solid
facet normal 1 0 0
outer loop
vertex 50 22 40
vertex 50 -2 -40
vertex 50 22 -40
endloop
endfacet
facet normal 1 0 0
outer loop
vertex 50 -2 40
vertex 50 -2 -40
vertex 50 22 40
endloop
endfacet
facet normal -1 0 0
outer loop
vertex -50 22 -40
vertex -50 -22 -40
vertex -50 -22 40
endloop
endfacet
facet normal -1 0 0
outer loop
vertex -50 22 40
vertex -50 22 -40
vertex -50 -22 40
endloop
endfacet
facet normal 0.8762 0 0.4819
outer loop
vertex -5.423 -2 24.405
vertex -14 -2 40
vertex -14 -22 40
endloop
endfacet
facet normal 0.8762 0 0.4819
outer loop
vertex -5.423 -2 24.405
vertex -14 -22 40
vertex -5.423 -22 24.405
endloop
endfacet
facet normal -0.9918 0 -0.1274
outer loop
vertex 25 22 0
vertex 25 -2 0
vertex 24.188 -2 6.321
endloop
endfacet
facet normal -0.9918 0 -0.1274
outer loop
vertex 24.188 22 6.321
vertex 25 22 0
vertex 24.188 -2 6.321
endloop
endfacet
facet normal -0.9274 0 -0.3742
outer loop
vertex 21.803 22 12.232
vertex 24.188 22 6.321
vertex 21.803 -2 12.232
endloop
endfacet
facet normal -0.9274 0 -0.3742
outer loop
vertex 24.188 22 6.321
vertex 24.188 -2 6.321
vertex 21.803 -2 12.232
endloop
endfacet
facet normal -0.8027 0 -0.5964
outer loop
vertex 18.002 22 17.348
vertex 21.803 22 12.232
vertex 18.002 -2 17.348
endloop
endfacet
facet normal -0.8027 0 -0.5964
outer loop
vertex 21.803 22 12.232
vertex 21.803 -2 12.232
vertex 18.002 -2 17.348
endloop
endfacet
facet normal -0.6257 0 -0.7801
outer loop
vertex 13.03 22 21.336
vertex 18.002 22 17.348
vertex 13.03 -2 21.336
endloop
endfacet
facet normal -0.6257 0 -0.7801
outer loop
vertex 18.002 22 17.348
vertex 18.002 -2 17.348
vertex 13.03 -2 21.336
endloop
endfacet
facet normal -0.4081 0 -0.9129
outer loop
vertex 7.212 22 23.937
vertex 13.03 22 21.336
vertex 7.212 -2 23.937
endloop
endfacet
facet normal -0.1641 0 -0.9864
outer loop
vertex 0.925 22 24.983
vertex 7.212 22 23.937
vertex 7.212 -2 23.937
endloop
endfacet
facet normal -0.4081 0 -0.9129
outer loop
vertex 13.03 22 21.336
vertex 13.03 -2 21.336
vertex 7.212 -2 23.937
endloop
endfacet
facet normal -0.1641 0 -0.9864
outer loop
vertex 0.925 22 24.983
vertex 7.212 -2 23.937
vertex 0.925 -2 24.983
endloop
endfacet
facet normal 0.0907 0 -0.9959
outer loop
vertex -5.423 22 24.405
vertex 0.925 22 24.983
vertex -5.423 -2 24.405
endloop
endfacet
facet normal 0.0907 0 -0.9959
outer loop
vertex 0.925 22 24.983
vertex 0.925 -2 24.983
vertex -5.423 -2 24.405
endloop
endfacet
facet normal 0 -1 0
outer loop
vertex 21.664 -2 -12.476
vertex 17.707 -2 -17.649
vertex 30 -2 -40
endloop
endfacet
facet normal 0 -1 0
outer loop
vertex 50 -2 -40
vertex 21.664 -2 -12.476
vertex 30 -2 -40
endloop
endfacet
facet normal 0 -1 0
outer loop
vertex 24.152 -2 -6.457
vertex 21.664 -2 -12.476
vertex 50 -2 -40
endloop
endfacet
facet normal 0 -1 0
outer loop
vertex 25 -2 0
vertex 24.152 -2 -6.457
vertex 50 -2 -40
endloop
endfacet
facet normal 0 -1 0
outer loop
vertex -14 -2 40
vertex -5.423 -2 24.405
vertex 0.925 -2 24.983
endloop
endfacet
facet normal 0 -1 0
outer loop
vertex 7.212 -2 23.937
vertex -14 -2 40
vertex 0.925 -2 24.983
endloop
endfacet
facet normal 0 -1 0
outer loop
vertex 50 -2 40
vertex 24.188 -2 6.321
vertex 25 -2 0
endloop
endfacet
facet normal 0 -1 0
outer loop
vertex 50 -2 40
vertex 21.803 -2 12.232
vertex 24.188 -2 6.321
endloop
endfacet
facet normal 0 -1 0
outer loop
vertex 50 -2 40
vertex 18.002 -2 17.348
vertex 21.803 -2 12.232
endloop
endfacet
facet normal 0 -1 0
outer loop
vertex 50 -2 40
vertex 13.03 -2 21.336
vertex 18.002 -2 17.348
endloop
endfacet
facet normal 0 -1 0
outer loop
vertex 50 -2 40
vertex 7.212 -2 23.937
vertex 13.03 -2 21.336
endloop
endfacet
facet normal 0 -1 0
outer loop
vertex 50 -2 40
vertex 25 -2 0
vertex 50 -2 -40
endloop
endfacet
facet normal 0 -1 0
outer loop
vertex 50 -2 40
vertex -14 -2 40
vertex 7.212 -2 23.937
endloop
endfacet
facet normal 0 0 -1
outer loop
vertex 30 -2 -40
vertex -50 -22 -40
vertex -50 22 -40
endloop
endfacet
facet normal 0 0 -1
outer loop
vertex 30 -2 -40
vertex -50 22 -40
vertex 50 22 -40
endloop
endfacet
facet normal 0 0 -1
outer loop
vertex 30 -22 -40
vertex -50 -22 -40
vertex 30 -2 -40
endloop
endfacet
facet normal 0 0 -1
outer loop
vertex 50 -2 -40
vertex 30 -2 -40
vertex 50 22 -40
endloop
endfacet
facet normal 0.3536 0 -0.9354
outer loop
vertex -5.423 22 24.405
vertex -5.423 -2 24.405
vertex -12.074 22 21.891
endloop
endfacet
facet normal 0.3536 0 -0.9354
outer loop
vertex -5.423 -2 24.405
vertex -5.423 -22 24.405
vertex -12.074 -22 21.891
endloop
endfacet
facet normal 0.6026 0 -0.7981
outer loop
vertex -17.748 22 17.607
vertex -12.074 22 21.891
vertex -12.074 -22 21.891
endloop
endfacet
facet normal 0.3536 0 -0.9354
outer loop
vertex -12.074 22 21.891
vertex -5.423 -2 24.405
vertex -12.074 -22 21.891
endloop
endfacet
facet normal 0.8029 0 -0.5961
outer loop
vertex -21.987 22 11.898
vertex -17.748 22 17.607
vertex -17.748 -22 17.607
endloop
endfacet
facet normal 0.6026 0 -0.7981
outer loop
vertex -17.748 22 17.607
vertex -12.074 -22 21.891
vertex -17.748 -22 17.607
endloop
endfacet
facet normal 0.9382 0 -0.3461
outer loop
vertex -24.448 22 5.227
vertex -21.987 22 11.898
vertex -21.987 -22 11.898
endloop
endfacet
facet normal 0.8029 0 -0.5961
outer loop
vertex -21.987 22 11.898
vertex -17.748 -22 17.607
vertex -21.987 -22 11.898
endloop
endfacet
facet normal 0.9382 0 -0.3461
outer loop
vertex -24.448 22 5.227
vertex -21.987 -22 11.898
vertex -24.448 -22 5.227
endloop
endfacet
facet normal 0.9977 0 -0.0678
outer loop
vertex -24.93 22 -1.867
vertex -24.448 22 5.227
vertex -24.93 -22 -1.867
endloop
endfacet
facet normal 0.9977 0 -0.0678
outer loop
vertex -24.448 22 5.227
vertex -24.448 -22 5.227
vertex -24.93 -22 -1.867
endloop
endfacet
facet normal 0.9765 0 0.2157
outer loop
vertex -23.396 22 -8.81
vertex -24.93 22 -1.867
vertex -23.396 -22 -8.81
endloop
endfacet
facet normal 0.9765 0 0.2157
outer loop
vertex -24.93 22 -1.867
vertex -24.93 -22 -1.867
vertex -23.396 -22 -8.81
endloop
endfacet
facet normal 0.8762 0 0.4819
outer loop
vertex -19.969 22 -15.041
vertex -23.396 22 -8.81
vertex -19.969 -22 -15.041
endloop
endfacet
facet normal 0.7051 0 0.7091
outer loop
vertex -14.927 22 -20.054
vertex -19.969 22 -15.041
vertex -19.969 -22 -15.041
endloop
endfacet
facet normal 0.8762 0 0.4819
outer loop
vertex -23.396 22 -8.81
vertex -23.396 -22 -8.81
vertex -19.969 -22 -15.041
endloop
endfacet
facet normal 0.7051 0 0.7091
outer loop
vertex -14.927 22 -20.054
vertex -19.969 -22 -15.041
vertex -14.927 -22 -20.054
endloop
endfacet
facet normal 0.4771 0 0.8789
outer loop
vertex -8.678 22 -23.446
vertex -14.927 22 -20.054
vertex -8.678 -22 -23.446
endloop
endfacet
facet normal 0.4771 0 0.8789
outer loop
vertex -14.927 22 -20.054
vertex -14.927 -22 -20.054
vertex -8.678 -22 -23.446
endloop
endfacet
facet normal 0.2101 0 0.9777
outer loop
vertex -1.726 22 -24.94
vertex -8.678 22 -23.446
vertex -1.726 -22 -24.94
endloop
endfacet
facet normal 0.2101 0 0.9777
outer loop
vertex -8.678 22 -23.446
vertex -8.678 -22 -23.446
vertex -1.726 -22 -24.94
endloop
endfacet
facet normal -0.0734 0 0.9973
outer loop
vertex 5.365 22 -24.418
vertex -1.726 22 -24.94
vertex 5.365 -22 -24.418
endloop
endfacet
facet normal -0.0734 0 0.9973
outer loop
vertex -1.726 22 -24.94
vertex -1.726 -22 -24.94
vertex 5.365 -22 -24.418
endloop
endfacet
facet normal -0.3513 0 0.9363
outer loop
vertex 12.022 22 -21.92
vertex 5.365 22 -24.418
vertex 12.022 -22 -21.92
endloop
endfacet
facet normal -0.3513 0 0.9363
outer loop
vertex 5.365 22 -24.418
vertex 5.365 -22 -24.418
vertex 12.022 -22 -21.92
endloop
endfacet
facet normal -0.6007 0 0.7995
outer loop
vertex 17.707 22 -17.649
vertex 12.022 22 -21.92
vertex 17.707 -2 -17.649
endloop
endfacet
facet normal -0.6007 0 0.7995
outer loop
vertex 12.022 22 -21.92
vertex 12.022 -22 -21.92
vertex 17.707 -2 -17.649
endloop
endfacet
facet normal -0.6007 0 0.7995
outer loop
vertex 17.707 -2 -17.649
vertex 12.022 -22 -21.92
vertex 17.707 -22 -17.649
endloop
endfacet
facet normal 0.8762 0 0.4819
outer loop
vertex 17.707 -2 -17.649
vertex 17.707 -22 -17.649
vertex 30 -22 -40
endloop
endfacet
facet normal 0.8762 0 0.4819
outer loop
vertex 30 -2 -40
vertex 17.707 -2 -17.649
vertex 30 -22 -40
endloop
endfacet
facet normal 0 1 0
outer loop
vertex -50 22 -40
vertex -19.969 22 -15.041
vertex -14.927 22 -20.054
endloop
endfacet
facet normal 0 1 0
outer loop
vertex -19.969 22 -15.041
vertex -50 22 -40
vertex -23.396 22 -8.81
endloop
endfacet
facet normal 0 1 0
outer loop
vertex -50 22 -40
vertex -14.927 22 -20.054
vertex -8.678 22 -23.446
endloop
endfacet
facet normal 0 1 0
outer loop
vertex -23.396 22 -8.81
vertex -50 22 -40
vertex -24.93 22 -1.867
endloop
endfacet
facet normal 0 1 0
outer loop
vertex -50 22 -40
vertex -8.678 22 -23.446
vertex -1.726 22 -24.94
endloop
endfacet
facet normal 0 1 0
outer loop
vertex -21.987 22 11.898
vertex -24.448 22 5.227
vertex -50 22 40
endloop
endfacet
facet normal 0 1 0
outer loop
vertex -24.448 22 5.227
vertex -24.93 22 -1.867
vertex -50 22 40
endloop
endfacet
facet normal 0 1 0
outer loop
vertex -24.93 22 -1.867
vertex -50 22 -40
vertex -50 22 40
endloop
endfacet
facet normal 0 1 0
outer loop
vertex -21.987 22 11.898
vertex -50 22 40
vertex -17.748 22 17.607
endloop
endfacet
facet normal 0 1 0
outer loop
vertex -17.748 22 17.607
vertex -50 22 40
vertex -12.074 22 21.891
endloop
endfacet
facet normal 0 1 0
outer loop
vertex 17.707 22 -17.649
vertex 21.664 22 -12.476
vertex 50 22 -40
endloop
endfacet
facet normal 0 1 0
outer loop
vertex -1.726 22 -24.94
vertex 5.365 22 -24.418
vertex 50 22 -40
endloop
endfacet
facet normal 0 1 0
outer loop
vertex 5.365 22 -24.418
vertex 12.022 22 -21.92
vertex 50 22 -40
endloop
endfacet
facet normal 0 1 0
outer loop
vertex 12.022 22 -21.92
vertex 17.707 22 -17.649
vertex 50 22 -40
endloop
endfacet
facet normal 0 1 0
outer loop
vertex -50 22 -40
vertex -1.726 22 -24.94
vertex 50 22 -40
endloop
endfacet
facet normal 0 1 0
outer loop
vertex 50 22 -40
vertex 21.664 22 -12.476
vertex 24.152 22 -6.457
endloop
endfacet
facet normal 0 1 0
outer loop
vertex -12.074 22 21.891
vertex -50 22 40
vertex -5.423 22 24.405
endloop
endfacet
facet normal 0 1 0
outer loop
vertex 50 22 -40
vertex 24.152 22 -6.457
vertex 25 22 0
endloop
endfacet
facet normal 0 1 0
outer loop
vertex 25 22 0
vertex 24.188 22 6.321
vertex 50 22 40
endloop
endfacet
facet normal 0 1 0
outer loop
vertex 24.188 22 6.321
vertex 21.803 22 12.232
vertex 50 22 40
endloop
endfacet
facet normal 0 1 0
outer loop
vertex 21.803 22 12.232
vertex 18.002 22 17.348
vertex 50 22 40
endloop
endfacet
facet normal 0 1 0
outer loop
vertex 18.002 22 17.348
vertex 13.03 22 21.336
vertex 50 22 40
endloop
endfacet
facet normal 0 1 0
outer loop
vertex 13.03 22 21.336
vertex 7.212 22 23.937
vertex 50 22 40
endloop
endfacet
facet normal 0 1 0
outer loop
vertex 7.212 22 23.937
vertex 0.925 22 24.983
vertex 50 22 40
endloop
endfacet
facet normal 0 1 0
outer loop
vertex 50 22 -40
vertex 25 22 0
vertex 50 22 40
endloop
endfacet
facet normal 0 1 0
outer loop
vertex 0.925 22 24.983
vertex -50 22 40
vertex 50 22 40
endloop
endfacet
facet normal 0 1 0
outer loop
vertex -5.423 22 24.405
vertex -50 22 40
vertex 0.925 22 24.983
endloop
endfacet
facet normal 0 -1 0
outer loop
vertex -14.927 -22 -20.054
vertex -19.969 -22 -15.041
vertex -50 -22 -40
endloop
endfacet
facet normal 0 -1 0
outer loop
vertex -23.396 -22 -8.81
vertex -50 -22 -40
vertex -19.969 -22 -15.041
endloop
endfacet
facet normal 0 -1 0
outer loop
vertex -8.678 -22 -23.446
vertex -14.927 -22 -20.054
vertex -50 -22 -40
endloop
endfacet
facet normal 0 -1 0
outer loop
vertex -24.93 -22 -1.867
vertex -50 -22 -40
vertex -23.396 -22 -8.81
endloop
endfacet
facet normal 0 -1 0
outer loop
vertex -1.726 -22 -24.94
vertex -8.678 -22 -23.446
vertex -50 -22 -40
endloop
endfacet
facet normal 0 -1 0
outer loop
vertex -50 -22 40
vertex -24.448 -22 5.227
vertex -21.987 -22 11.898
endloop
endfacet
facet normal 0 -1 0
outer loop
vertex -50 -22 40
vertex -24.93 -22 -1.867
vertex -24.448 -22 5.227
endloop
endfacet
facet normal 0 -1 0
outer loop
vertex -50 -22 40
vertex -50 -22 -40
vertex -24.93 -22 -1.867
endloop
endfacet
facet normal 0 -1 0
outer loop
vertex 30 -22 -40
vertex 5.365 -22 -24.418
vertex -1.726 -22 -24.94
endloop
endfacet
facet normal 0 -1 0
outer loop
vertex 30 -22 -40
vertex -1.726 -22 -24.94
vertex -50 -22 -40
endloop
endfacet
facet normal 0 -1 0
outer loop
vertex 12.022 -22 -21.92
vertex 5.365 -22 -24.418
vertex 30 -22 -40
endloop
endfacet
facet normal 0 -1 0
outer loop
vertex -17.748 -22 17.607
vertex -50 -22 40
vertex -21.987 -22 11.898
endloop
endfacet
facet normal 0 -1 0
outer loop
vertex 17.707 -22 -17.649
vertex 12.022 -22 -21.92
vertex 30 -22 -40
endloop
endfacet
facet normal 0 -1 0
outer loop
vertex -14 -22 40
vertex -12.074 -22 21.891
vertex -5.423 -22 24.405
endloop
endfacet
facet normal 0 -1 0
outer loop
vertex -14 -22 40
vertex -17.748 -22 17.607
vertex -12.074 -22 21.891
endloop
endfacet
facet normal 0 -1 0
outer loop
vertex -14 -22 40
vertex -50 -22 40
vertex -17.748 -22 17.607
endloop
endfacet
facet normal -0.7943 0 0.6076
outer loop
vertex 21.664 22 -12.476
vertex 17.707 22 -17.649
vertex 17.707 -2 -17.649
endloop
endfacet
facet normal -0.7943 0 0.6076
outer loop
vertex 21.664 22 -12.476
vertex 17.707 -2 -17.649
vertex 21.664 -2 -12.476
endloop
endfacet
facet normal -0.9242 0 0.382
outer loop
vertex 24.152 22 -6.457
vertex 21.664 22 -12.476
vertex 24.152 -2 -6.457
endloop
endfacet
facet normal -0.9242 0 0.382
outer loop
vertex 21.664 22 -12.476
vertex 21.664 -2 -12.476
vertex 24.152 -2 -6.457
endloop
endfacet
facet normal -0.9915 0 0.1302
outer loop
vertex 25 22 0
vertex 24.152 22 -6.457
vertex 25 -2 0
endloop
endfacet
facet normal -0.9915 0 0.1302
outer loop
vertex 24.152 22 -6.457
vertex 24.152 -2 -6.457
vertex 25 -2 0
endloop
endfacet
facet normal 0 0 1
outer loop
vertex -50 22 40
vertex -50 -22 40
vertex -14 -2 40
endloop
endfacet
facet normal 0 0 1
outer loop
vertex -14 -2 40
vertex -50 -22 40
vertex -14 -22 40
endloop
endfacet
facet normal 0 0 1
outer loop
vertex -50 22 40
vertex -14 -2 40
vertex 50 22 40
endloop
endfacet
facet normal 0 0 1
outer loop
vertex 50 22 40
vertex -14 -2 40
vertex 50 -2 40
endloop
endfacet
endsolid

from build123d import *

# Parameters (mm, degrees)
F0_W     = 100
F0_H     = 80
F1_DEPTH = 22
F3_DEPTH = 20
F5_DEPTH = 44.001


with BuildPart() as f1:
    # F0 (on Front) → F1 (new body, symmetric)
    with BuildSketch(Plane.XZ):
        Rectangle(F0_W, F0_H)
    extrude(amount=F1_DEPTH, both=True)

    # F2 (on face) → F3 (cut)
    with BuildSketch(Plane.XZ.offset(22)):
        Polygon((-14, 40), (30, -40), (50, -40), (50, 40), align=None)
    extrude(amount=-F3_DEPTH, mode=Mode.SUBTRACT)

    # F4 (on face) → F5 (cut, through all)
    with BuildSketch(Plane.XZ.offset(22)):
        with BuildLine():
            ThreePointArc((17.706716, -17.648575), (23.104847, -9.548091), (25, 0))
            ThreePointArc((25, 0), (15.64343, 19.500848), (-5.422647, 24.404813))
            Line((-5.422647, 24.404813), (17.706716, -17.648575))
        make_face()
        with BuildLine():
            Line((17.706716, -17.648575), (-5.422647, 24.404813))
            ThreePointArc((-5.422647, 24.404813), (-21.905398, -12.047969), (17.706716, -17.648575))
        make_face()
    extrude(amount=-F5_DEPTH, mode=Mode.SUBTRACT)


solid = f1.part
